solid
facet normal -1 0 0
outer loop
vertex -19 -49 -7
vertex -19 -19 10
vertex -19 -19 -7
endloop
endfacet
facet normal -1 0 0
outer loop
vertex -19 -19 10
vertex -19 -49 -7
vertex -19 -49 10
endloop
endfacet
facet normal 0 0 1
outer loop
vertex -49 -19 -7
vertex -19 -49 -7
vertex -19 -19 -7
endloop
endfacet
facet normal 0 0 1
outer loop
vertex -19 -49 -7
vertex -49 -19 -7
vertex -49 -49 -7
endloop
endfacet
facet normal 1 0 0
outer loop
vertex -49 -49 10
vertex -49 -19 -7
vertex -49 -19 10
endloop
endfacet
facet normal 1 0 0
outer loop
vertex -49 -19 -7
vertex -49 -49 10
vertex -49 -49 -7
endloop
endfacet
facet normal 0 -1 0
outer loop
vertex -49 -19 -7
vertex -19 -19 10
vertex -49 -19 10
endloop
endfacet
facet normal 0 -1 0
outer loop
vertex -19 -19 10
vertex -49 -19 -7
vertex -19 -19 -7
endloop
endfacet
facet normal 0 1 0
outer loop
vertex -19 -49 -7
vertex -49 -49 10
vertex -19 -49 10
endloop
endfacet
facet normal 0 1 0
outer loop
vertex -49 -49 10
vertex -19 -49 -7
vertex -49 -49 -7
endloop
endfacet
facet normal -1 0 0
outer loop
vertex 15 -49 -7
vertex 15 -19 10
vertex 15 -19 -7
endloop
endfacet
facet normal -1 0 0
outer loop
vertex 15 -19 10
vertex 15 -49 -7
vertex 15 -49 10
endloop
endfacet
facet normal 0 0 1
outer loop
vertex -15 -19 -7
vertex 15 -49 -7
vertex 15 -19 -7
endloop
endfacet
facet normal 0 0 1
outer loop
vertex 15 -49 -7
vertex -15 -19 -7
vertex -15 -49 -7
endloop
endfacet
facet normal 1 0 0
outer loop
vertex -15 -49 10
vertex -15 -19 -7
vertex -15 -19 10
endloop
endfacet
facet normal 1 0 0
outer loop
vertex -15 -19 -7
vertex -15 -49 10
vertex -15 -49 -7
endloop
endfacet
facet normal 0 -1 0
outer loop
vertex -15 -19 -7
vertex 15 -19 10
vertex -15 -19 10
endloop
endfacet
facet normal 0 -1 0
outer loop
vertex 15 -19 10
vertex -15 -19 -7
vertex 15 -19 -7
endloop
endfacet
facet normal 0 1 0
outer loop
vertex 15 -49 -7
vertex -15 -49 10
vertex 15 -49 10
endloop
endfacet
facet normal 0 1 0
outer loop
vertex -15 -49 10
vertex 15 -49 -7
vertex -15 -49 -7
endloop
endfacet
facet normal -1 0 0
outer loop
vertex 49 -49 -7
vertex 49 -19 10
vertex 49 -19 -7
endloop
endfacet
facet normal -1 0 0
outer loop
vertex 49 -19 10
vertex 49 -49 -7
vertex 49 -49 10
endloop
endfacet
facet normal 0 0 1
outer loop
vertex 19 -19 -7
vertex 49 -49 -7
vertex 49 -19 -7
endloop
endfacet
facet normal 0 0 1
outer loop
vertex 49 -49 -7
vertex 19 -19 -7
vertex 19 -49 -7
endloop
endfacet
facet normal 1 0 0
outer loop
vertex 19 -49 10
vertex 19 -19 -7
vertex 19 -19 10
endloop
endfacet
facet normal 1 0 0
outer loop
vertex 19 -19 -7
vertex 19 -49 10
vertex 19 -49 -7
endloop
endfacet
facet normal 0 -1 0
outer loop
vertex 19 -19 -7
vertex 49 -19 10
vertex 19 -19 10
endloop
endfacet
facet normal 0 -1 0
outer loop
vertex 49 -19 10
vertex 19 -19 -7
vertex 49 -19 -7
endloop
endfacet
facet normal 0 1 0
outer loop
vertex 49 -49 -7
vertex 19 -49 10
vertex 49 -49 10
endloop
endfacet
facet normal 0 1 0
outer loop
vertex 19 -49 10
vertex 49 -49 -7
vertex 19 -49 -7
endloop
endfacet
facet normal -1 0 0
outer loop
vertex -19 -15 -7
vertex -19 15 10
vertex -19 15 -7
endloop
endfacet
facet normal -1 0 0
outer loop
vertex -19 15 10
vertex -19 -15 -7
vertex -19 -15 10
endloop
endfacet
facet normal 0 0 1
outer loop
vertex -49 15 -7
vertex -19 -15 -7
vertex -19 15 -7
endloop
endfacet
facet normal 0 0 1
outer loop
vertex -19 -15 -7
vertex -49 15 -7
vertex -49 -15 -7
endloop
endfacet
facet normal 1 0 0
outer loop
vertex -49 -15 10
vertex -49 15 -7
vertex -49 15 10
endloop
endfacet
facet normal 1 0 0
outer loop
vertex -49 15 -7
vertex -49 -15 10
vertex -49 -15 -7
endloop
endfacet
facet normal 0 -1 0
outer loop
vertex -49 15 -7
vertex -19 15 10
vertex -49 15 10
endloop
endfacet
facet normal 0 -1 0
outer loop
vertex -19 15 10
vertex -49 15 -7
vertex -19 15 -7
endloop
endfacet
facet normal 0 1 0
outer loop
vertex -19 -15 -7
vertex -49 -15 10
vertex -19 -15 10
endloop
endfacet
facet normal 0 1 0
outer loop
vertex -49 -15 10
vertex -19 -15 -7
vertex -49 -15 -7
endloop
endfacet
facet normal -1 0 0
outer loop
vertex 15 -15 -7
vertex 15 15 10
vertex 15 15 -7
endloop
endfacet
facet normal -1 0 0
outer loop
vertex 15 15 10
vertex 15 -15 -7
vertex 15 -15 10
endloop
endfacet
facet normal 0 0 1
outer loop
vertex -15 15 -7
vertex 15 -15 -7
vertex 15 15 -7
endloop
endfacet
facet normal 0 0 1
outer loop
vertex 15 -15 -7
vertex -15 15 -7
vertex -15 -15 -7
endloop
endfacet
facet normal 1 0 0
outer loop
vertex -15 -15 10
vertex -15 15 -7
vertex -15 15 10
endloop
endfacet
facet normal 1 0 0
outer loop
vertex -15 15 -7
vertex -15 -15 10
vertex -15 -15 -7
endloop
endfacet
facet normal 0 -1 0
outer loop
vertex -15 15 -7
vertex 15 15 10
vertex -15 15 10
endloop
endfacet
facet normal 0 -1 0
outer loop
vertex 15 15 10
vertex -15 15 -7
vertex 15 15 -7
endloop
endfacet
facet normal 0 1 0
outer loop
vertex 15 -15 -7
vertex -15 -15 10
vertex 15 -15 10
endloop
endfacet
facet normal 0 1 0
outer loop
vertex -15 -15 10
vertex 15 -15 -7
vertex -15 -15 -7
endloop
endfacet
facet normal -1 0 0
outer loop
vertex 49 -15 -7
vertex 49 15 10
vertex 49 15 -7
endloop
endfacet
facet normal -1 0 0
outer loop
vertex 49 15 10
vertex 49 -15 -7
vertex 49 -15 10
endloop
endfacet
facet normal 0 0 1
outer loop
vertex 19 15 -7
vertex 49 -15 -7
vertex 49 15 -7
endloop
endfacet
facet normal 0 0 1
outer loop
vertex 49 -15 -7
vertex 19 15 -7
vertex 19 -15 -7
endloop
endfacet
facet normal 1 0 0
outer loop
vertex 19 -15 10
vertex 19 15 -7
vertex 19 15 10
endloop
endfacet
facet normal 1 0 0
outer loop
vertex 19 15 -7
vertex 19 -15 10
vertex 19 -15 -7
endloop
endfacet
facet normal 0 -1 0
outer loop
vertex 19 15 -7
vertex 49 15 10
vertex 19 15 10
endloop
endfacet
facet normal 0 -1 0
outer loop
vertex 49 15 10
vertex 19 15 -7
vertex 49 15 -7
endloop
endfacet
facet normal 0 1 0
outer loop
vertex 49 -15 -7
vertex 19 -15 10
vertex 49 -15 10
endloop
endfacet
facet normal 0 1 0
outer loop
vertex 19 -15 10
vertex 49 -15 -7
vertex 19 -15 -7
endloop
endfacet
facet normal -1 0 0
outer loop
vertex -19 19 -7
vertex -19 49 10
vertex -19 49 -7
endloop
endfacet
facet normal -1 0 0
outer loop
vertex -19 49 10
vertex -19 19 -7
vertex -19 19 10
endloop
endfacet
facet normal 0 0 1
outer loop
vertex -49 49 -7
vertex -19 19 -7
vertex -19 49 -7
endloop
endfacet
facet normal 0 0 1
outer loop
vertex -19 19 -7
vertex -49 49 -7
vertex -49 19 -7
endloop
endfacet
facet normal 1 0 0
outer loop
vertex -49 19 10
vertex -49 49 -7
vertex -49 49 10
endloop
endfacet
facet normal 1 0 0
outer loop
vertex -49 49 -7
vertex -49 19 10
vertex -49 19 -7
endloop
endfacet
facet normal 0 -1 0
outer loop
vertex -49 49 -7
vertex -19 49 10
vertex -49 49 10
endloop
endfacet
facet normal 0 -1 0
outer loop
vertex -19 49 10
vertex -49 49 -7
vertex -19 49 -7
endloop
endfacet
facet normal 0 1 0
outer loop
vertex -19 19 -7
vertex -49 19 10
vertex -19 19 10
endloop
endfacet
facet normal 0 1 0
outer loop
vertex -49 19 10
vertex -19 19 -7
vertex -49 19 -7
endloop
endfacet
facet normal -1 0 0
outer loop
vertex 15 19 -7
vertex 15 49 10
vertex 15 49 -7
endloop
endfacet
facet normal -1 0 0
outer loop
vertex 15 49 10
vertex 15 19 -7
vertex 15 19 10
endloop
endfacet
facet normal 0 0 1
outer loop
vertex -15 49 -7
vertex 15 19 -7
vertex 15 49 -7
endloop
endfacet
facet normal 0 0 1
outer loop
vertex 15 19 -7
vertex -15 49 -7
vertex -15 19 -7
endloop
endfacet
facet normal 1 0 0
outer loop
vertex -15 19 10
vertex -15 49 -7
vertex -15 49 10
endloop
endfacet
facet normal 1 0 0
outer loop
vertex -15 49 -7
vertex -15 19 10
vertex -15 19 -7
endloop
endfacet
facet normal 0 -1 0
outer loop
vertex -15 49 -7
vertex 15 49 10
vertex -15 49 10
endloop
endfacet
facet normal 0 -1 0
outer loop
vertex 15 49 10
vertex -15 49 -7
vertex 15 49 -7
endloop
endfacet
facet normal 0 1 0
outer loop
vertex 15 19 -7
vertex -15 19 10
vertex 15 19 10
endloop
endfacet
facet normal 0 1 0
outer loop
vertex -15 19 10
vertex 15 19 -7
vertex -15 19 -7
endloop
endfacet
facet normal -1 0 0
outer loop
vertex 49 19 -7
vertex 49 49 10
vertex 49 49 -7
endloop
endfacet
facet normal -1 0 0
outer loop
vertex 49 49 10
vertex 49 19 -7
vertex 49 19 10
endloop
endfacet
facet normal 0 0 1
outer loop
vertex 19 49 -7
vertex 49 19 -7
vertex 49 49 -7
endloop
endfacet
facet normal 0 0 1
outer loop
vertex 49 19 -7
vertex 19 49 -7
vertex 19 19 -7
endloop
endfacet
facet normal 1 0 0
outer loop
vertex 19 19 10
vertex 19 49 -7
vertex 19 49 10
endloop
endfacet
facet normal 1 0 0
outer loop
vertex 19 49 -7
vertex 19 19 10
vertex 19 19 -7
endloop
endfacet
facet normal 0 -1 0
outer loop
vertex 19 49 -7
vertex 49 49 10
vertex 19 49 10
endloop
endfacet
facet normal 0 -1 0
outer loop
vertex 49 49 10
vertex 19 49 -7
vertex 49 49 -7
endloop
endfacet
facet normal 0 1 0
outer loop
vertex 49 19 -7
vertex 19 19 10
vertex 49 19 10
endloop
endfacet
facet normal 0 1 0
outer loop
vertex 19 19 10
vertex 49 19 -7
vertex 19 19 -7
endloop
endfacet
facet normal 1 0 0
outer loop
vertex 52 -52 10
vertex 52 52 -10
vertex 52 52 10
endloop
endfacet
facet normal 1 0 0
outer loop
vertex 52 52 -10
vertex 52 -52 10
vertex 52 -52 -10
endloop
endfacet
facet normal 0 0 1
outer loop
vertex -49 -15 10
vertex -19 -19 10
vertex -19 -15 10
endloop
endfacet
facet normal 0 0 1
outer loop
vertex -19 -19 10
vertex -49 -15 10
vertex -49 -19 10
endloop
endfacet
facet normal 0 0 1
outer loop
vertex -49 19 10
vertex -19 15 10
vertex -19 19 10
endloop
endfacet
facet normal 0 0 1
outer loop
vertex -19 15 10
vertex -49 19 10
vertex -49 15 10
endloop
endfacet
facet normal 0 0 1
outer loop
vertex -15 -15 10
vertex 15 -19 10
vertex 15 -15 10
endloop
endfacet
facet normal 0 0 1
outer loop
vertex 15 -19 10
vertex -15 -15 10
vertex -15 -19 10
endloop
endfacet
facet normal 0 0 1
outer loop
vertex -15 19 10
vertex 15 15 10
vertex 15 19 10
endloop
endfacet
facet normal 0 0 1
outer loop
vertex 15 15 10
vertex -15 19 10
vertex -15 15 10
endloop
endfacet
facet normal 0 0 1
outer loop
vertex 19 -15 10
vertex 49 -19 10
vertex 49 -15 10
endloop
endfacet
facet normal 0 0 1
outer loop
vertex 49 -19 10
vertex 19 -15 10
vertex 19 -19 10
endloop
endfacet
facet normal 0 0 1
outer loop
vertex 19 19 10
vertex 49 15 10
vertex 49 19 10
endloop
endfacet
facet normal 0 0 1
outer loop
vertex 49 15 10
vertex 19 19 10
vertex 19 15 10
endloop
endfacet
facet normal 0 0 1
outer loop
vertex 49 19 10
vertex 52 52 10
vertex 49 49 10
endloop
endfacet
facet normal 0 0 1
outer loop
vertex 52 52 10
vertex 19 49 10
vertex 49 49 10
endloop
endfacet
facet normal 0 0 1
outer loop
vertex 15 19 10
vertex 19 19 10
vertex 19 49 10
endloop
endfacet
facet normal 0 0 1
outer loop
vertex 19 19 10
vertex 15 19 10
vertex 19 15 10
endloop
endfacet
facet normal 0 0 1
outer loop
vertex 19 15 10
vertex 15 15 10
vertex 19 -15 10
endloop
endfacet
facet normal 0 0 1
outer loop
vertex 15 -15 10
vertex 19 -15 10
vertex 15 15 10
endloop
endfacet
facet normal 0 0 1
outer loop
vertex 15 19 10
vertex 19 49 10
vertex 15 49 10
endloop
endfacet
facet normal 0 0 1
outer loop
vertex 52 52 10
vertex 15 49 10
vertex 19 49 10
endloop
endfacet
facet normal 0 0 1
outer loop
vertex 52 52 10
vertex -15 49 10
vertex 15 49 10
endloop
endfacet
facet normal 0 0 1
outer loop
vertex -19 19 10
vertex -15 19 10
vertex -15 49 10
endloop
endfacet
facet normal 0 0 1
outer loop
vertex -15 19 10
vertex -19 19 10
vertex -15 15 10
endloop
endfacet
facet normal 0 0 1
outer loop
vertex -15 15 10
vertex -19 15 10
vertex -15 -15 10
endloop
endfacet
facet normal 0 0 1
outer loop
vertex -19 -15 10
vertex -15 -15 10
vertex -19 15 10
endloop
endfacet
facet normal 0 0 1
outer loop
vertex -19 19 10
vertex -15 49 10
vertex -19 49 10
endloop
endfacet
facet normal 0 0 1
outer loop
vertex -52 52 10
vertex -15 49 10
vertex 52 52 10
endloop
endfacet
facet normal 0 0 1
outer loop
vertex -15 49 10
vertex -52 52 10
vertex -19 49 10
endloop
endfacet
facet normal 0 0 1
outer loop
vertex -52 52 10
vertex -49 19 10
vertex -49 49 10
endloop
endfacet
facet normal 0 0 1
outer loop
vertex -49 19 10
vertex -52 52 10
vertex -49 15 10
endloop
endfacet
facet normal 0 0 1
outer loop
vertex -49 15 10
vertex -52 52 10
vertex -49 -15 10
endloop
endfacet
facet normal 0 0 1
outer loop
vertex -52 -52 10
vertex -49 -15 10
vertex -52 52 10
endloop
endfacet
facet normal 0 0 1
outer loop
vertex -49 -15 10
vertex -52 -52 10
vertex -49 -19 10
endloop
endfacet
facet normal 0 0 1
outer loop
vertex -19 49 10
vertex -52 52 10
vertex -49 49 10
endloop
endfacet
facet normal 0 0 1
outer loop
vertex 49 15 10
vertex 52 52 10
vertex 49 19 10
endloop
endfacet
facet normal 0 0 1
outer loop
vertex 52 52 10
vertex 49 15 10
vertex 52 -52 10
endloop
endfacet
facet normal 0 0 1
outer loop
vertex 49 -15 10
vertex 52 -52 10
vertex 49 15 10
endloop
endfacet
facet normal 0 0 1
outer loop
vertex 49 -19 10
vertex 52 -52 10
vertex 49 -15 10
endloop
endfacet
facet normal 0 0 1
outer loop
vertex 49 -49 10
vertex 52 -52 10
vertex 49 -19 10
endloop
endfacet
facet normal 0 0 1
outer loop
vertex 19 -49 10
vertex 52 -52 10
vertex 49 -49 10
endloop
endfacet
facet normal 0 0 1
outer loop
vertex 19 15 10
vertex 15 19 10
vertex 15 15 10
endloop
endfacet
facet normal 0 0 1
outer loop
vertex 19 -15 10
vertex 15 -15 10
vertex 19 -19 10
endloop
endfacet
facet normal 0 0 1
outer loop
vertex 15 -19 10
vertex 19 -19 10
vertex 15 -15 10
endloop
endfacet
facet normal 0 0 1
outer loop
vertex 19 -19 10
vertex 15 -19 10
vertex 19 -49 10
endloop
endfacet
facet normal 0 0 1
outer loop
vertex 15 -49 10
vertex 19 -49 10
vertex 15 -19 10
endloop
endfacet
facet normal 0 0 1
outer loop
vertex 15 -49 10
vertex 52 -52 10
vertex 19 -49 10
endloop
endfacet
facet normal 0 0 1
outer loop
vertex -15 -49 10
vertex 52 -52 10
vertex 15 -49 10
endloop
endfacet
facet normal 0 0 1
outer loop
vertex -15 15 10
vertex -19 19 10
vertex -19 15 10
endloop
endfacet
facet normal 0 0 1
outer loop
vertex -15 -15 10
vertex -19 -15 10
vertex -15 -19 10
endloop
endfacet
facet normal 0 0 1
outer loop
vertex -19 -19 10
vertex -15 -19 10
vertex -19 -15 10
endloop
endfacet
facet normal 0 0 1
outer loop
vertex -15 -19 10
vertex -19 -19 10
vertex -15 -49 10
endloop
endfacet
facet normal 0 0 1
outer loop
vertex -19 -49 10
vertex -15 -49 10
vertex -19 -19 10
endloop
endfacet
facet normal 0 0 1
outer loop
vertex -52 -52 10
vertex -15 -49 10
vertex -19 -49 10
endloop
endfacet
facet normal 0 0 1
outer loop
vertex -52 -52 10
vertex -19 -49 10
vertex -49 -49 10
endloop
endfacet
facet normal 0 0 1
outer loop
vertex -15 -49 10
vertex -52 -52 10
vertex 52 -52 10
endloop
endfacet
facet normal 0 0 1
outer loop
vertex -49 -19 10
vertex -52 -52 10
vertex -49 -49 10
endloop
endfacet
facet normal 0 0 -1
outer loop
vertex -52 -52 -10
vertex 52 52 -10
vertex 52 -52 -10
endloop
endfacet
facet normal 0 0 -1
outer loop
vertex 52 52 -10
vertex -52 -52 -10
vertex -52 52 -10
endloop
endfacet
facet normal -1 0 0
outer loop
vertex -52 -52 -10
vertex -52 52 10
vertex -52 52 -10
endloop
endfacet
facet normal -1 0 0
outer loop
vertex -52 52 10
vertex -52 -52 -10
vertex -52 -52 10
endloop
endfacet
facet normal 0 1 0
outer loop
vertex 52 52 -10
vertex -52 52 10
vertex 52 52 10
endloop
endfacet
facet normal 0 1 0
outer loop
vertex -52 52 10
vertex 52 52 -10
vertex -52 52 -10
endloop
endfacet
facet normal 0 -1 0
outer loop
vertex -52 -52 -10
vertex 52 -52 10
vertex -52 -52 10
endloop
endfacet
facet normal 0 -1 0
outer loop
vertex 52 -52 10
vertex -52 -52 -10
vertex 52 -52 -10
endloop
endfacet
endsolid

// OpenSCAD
$fn = 32;

// ----------------------------------------------------------------------
// Pocket plate 104 x 104 x 20
// 3 x 3 pockets 30 mm square, 17 mm deep
// ----------------------------------------------------------------------

// --- parameters (mm) ---
thickness = 20;  // plate thickness
floor_t = 3;     // material left under each pocket
pocket = 30;     // pocket side length
pitch_x = 34;    // pocket pitch along X
pitch_y = 34;    // pocket pitch along Y
cols = 3;        // pockets per row
rows = 3;        // rows of pockets

// --- derived feature positions (mm) ---
depth = thickness - floor_t;        // = 17   pocket depth, down to the floor
span_x = (cols - 1) * pitch_x;      // = 68   distance between outer pockets
span_y = (rows - 1) * pitch_y;      // = 68   distance between outer pocket rows
origin_x = -span_x / 2;             // = -34   X of the first pocket
origin_y = -span_y / 2;             // = -34   Y of the first pocket
plate = [span_x + pocket + 6, span_y + pocket + 6, thickness];  // = [104, 104, 20]   overall size: pockets plus 3 mm of wall on each side
feature_centers = [
  [origin_x + 0 * pitch_x, origin_y + 0 * pitch_y],
  [origin_x + 1 * pitch_x, origin_y + 0 * pitch_y],
  [origin_x + 2 * pitch_x, origin_y + 0 * pitch_y],
  [origin_x + 0 * pitch_x, origin_y + 1 * pitch_y],
  [origin_x + 1 * pitch_x, origin_y + 1 * pitch_y],
  [origin_x + 2 * pitch_x, origin_y + 1 * pitch_y],
  [origin_x + 0 * pitch_x, origin_y + 2 * pitch_y],
  [origin_x + 1 * pitch_x, origin_y + 2 * pitch_y],
  [origin_x + 2 * pitch_x, origin_y + 2 * pitch_y]
];   // pocket centres, used verbatim by the cutter loop

// plate outline, then one pocket per centre in feature_centers
difference() {
  cube(plate, center = true);
  for (centre = feature_centers)
    translate([centre[0] - pocket / 2, centre[1] - pocket / 2, plate[2] / 2 - depth])
      cube([pocket, pocket, depth + 1]);  // centred on the declared pocket centre
}
